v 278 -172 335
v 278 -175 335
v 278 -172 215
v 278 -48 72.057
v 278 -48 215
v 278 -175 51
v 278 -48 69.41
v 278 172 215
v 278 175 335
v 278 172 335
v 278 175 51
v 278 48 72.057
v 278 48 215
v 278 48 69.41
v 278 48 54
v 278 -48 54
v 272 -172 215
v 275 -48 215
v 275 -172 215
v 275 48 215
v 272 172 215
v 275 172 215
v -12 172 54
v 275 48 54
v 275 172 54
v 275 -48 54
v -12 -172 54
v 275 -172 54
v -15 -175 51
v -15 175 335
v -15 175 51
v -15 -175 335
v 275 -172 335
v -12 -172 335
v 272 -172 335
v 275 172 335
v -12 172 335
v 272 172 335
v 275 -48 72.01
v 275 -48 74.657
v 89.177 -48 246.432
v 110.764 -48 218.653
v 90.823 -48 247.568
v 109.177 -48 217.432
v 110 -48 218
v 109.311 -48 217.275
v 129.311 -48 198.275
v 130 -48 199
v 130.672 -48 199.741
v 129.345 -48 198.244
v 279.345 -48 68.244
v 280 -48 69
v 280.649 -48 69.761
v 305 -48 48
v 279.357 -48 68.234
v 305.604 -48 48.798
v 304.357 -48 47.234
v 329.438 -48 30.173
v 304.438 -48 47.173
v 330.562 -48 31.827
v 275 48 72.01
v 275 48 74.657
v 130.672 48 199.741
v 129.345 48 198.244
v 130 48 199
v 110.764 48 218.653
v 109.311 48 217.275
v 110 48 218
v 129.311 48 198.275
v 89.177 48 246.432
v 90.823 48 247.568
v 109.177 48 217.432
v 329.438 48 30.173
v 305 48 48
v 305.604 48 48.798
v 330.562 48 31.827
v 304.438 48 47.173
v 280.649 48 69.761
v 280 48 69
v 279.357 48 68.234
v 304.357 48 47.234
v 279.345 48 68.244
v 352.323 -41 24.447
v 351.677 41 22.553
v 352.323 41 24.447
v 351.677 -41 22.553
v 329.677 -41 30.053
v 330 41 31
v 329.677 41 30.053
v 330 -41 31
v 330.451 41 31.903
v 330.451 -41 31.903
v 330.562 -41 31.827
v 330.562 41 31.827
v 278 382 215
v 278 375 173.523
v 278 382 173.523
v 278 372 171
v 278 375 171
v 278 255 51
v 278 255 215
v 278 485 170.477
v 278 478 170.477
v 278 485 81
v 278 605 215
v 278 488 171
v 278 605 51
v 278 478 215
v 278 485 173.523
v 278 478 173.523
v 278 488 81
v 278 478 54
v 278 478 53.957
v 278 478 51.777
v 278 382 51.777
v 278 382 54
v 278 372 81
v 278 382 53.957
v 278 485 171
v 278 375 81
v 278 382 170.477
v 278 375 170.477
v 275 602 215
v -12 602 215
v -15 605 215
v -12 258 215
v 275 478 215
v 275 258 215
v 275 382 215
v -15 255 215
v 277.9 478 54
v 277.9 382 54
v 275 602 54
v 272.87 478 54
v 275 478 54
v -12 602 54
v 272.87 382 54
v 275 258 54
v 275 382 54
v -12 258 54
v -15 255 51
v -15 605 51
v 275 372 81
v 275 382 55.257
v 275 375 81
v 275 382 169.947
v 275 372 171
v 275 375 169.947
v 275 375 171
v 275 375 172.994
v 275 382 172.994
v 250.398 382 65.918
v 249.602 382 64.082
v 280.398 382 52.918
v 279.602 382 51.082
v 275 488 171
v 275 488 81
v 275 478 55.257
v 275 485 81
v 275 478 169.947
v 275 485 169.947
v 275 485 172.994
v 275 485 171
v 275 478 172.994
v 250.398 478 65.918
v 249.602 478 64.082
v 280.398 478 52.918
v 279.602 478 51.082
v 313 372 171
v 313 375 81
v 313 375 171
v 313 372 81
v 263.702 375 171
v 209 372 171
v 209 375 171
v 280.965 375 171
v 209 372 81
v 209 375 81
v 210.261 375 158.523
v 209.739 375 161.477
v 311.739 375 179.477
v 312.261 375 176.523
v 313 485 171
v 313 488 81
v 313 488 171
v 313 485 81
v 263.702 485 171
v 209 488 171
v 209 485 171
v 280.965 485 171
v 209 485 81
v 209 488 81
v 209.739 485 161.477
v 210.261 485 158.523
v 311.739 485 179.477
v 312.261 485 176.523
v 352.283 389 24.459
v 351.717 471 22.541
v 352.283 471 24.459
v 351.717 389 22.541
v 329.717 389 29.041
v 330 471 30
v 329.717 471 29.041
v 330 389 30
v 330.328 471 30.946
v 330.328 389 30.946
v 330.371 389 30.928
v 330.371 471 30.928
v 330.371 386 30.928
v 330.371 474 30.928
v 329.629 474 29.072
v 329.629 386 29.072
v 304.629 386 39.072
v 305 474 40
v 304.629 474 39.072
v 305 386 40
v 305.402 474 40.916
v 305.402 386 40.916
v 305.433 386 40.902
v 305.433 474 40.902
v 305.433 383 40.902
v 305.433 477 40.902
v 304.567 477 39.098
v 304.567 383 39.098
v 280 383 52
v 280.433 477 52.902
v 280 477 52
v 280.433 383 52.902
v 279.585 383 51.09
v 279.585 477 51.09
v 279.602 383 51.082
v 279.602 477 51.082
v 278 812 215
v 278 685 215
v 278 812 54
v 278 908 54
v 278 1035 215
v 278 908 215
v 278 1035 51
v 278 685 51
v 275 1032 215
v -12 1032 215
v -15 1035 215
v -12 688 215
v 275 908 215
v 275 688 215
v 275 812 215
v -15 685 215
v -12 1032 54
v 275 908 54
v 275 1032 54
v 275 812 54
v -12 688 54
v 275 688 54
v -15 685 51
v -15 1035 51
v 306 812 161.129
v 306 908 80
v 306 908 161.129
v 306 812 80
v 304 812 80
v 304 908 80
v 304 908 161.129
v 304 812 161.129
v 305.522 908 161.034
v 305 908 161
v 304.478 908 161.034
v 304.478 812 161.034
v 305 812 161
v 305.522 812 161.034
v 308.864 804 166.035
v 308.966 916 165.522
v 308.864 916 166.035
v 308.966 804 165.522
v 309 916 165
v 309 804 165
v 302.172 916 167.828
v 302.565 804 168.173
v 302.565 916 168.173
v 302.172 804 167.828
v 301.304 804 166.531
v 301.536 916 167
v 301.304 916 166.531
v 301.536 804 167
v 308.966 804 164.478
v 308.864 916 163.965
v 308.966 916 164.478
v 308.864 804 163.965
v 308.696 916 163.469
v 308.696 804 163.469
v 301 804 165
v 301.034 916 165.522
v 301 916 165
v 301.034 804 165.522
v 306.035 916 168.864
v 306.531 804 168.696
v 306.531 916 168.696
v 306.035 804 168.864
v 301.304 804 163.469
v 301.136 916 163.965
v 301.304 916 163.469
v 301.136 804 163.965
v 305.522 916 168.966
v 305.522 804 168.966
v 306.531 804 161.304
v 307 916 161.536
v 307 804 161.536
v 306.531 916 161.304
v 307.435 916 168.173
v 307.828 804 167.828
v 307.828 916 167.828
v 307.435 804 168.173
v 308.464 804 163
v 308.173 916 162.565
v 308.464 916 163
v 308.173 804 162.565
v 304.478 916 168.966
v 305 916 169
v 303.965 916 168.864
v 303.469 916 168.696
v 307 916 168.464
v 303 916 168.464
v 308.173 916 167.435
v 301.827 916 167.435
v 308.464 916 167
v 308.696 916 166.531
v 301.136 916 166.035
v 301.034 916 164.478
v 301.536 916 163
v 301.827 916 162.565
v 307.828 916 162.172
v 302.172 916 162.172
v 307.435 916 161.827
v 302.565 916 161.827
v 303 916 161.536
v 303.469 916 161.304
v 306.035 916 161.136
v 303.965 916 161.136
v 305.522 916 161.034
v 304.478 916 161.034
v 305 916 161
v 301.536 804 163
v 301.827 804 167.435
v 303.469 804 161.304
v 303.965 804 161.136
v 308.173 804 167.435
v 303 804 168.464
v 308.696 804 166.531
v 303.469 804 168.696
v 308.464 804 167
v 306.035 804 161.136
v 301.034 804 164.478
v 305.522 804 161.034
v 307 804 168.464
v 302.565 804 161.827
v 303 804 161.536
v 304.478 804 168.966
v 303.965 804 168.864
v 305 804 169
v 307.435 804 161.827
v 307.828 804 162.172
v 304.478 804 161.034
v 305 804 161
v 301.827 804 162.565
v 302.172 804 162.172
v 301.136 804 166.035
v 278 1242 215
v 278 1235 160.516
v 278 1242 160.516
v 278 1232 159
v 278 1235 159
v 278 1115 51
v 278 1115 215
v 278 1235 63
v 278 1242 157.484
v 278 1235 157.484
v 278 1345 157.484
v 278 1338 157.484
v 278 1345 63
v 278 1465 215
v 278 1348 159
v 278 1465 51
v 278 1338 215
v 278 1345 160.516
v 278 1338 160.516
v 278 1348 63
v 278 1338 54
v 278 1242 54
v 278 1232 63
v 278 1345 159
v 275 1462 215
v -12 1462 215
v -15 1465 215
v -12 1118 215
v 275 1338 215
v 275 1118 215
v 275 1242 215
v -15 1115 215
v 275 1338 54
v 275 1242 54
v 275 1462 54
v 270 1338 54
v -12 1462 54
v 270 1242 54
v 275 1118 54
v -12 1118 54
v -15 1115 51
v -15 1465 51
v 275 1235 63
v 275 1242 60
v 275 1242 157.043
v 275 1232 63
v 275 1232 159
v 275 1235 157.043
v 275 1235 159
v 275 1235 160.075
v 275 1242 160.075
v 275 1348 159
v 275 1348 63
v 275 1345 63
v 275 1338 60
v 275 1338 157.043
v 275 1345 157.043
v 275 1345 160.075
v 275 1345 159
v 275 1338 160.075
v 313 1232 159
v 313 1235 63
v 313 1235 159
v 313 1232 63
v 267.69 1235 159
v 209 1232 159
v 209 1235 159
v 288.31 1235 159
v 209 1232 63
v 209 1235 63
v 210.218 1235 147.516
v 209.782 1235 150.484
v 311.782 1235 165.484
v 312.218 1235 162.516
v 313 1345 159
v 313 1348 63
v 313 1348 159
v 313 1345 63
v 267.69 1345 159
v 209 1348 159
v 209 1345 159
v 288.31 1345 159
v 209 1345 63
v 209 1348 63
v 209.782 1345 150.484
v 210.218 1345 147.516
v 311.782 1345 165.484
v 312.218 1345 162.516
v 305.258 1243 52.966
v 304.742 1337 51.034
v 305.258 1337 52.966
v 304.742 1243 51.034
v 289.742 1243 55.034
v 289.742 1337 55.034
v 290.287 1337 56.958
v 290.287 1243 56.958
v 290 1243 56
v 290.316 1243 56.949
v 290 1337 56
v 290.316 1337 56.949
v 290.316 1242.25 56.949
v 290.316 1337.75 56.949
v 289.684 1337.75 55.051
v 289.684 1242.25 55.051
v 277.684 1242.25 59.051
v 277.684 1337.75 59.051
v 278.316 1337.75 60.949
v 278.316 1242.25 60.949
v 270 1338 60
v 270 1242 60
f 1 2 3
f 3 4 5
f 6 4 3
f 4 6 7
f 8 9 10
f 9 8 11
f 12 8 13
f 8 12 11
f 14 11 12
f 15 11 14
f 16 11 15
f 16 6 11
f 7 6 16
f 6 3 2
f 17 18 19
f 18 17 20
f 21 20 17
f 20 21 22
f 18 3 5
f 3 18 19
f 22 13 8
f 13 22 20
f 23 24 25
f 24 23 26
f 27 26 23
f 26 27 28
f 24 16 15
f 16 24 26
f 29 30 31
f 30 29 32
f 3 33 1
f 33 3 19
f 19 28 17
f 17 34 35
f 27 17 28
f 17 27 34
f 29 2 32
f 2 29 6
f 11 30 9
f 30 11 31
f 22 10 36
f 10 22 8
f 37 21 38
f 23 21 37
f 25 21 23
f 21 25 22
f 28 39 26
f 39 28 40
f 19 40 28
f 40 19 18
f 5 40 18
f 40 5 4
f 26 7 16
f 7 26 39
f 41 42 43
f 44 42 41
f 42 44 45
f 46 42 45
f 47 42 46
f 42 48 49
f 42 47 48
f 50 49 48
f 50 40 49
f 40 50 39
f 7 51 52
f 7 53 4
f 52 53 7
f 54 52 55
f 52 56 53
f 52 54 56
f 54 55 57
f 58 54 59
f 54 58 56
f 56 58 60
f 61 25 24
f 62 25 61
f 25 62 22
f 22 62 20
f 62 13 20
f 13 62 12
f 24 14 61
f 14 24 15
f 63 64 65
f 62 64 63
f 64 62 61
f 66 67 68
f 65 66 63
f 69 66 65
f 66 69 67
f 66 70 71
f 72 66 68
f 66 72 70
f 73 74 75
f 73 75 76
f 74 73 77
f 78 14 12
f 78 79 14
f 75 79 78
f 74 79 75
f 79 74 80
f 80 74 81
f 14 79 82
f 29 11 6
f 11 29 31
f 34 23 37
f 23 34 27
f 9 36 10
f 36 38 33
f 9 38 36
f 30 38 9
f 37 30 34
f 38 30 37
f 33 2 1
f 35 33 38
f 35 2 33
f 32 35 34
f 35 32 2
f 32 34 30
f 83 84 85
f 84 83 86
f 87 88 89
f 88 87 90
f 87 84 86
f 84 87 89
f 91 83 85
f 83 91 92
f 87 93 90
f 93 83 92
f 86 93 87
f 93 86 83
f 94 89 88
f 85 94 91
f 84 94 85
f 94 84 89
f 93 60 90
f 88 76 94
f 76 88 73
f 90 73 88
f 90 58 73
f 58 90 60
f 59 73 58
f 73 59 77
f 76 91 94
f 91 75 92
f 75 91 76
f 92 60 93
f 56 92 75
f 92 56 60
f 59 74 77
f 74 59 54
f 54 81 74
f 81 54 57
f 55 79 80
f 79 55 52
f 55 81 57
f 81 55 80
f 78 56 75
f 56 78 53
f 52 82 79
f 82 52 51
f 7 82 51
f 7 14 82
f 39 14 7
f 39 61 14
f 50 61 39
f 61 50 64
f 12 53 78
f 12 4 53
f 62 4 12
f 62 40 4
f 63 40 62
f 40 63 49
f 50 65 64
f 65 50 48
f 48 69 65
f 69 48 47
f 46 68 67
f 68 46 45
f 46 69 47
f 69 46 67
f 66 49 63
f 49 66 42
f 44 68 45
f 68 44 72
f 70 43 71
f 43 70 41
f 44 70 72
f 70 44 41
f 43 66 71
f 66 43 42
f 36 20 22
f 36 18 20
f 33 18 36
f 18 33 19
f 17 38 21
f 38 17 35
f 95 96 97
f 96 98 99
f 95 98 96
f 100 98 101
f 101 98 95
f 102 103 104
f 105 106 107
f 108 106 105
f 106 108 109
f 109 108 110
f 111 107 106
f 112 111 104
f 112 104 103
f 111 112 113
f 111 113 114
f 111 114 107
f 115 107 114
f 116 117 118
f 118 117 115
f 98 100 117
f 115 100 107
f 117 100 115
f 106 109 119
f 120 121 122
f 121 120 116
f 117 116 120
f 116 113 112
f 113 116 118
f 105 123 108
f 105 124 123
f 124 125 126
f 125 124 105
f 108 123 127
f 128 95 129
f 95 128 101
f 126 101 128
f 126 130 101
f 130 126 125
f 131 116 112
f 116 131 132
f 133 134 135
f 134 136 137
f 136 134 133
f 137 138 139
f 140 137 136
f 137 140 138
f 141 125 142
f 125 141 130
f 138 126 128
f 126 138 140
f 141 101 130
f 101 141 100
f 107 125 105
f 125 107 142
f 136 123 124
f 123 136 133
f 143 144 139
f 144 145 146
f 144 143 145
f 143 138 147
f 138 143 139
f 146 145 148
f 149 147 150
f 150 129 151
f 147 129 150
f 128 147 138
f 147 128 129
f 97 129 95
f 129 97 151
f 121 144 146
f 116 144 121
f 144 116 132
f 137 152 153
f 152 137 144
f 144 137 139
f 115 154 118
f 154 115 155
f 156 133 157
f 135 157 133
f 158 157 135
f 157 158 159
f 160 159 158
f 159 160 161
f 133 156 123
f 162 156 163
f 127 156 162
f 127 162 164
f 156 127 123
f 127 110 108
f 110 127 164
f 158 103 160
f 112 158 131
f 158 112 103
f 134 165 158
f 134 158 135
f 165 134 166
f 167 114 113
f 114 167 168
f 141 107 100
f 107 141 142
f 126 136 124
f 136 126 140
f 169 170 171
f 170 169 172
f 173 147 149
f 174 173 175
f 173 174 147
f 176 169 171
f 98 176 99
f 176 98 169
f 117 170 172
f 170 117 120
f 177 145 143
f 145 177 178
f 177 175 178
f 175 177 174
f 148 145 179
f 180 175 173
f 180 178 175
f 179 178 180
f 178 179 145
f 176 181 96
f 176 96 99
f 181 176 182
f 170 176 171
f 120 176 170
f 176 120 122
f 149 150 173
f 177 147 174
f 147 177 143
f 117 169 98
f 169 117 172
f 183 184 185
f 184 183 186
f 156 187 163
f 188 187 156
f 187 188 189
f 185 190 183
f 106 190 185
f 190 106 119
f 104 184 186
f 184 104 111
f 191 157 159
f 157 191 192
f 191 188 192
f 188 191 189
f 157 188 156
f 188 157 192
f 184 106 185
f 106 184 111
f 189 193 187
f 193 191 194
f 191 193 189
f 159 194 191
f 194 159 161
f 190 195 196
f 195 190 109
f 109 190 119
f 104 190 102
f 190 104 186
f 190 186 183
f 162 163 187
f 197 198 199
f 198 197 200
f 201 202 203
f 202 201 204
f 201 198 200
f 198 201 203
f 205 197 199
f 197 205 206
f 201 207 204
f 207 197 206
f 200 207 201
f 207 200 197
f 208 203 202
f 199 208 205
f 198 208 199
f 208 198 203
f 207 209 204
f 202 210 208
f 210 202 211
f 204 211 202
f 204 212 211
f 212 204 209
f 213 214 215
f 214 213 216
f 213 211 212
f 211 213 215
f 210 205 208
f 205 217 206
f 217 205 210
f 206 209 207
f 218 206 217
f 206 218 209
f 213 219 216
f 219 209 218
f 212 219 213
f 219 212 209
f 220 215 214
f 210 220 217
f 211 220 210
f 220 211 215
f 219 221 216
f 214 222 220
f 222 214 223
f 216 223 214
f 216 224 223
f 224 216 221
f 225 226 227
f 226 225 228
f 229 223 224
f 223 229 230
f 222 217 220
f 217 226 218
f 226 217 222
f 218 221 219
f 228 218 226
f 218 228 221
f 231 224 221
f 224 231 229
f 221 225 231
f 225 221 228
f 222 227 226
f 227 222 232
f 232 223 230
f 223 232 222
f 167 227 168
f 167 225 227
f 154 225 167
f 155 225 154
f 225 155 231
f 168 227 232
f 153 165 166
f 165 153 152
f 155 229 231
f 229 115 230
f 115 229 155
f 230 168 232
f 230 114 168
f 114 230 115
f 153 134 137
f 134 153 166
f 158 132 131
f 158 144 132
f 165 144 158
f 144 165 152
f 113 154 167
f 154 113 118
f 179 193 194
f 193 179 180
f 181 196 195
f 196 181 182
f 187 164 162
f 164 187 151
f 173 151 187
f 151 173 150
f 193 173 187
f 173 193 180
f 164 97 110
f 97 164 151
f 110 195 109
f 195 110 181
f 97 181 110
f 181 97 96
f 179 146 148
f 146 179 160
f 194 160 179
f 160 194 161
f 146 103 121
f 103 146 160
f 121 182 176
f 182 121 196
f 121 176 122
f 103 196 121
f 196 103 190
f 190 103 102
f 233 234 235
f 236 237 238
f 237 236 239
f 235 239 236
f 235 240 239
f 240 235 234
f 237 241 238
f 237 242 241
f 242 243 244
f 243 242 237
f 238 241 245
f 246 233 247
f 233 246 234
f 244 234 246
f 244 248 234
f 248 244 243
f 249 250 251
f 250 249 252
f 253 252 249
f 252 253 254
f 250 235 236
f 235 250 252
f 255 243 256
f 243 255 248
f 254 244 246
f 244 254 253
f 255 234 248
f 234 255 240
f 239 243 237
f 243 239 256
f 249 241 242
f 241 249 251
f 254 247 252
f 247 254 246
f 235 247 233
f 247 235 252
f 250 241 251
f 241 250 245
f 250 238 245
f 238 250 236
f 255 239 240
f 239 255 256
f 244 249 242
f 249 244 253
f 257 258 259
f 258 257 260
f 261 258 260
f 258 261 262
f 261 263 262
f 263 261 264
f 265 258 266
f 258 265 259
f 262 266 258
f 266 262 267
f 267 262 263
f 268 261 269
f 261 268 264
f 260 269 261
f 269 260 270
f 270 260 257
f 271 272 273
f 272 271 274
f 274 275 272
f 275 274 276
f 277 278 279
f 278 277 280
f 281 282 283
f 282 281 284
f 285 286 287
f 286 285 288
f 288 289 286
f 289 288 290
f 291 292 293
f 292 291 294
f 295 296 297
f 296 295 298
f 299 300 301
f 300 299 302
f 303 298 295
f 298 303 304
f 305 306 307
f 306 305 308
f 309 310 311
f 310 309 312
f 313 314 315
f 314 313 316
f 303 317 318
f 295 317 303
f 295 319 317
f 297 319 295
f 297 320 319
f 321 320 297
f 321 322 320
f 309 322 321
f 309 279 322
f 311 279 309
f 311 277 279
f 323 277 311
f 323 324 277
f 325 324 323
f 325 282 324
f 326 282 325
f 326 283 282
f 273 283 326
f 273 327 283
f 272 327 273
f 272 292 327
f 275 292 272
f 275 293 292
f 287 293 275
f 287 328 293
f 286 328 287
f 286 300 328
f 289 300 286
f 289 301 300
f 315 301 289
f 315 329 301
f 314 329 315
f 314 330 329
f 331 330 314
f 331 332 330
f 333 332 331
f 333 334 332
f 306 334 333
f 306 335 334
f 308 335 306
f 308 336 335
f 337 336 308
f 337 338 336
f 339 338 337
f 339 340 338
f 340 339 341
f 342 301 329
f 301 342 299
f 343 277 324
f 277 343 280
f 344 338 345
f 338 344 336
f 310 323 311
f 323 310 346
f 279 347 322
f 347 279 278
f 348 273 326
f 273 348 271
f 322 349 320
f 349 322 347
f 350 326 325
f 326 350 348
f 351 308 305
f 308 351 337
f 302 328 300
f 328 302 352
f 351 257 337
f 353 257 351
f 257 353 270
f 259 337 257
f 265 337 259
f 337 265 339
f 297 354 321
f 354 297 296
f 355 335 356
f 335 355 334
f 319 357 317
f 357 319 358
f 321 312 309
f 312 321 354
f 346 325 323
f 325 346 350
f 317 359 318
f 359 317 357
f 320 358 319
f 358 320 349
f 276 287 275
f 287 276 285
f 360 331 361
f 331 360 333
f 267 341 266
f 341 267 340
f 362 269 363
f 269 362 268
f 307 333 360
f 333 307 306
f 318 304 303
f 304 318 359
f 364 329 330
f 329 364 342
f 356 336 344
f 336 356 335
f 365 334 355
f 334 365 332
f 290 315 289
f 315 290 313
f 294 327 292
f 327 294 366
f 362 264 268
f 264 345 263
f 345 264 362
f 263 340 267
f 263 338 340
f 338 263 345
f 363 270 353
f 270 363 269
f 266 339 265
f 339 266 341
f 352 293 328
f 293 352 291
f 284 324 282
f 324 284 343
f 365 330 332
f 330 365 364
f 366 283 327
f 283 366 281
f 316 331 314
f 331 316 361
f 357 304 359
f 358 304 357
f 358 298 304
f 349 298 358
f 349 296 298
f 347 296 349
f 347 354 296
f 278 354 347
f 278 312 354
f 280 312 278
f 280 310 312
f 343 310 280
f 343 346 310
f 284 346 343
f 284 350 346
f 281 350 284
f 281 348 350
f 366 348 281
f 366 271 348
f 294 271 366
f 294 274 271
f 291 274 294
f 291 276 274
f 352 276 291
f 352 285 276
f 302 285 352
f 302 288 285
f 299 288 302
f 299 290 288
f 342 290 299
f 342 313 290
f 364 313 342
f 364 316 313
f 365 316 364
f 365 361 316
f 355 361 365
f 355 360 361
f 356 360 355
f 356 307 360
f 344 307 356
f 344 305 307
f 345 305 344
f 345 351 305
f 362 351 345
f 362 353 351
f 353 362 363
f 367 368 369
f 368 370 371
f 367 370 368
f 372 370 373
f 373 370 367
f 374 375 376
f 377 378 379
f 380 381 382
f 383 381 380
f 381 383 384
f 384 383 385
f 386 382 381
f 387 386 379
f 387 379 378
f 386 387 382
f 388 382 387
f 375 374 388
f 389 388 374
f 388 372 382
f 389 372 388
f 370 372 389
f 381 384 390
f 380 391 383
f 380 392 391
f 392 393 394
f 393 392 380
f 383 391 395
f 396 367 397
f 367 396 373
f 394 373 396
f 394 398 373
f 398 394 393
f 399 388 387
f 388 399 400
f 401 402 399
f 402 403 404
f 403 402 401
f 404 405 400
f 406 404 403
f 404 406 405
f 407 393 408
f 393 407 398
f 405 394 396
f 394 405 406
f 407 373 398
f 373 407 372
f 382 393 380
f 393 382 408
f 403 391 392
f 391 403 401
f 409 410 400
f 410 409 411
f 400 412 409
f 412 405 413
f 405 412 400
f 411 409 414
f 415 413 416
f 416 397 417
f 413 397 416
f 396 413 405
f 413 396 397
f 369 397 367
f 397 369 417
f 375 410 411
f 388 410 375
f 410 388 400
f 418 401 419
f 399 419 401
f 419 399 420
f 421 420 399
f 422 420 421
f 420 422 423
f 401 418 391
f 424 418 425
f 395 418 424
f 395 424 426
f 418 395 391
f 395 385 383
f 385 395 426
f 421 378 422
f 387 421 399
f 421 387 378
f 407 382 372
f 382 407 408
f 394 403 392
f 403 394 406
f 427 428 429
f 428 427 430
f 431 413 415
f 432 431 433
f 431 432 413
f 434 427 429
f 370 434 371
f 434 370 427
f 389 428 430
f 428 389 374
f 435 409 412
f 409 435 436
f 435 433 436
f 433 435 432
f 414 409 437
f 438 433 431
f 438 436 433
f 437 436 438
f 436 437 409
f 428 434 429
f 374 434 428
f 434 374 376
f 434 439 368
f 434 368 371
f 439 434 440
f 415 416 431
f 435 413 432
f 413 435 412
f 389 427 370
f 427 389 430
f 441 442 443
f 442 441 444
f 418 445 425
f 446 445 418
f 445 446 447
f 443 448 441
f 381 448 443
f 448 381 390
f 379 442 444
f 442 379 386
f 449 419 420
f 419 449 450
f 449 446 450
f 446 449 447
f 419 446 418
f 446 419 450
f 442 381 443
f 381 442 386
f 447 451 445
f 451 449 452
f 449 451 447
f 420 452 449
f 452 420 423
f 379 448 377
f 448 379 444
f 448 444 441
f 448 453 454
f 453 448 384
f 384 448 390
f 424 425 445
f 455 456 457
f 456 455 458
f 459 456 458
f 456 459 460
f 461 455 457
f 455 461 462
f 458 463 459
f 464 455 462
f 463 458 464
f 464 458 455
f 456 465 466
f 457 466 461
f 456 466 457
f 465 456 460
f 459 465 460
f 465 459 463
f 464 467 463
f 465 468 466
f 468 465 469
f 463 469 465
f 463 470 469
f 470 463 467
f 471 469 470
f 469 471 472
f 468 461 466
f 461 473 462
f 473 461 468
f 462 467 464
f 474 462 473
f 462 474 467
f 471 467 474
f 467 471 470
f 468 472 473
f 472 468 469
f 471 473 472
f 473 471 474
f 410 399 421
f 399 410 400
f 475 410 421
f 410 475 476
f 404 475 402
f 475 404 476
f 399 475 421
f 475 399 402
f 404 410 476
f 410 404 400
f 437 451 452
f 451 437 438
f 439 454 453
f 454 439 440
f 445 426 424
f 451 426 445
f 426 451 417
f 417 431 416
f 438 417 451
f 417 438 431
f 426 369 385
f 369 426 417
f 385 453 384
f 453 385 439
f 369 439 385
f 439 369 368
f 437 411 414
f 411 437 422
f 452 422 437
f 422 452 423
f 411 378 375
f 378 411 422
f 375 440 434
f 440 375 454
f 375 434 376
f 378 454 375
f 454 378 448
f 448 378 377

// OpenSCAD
// P2-47 dependent basket-entry comparison.  Concept/reference geometry only;
// no STL release.  Coordinates are millimetres in the v3 base frame.
variant = "all"; // [all,tall_open_drop,high_hood,one_way_flap,lip_cover]
$fn = 48;

floor_z = 54;
basket_front_x = 278;
basket_rear_x = -15;
basket_half_y = 175;
basket_top_z = 215;
entry_half_y = 48;

module basket_shell() {
  color([.65,.65,.68,.25]) {
    translate([(basket_front_x+basket_rear_x)/2,0,floor_z-1.5]) cube([basket_front_x-basket_rear_x,350,3],center=true);
    for(y=[-173.5,173.5]) translate([131.5,y,(floor_z+basket_top_z)/2]) cube([293,3,basket_top_z-floor_z],center=true);
    translate([basket_rear_x+1.5,0,(floor_z+basket_top_z)/2]) cube([3,350,basket_top_z-floor_z],center=true);
    for(y=[-111.5,111.5]) translate([basket_front_x-1.5,y,(floor_z+basket_top_z)/2]) cube([3,127,basket_top_z-floor_z],center=true);
  }
}

module panel_between(x0,z0,x1,z1,width=110,t=3,c=[.2,.55,.9,1]) {
  dx=x1-x0; dz=z1-z0; len=sqrt(dx*dx+dz*dz); a=atan2(dz,dx);
  color(c) translate([(x0+x1)/2,0,(z0+z1)/2]) rotate([0,-a,0]) cube([len,width,t],center=true);
}

module high_hood() {
  // Controlled-rise entry then 40+ mm rear-overhung hood.
  panel_between(352,23.5,330,30,82,2);
  panel_between(330,30,305,40,88,2);
  panel_between(305,40,280,52,94,2);
  panel_between(280,52,250,65,96,2);
  panel_between(210,160,312,178,110,3,[1,.55,.1,1]);
  for(y=[-56.5,56.5]) color([1,.55,.1,1]) translate([261,y,126]) cube([104,3,90],center=true);
}

module one_way_flap(angle=0) {
  // Physical concept: top hinge, positive rotation only into -X; positive
  // latch/stop required at 0 degrees.  Shown closed.
  color([.95,.35,.08,1]) translate([305,0,165]) rotate([0,angle,0]) translate([0,0,-42.5]) cube([2,96,85],center=true);
  color([.25,.25,.28,1]) translate([305,0,165]) rotate([90,0,0]) cylinder(d=8,h=112,center=true);
}

module lip_cover() {
  panel_between(305,52,290,56,94,2);
  panel_between(290,56,278,60,95.5,2);
  color([.95,.35,.08,1]) translate([272.5,0,57]) cube([5,96,6],center=true);
  panel_between(210,149,312,164,110,3,[1,.75,.15,1]);
  for(y=[-56.5,56.5]) color([1,.75,.15,1]) translate([261,y,111]) cube([104,3,96],center=true);
}

module tall_open_drop() {
  // P2-47 simplest candidate: 335 mm rim, uncovered bridge and rear drop.
  // No flap, hood or liner; the lower feed/singulator interface remains open.
  for(y=[-173.5,173.5]) color([.35,.72,.42,.55])
    translate([131.5,y,275]) cube([293,3,120],center=true);
  color([.35,.72,.42,.55]) translate([-13.5,0,275]) cube([3,350,120],center=true);
  color([.35,.72,.42,.55]) translate([273.5,0,275]) cube([3,350,120],center=true);
  pts=[[352,23.5],[330,31],[305,48],[280,69],[250,95],[220,121],[190,147],[160,173],[130,199],[110,218],[90,247]];
  for(i=[0:len(pts)-2]) panel_between(pts[i][0],pts[i][1],pts[i+1][0],pts[i+1][1],i==0?82:96,2,[.10,.62,.92,1]);
}

if (variant=="all") {
  for(i=[0:3]) translate([0,i*430,0]) { basket_shell(); if(i==0) tall_open_drop(); if(i==1) high_hood(); if(i==2) one_way_flap(); if(i==3) lip_cover(); }
} else {
  basket_shell();
  if(variant=="tall_open_drop") tall_open_drop();
  if(variant=="high_hood") high_hood();
  if(variant=="one_way_flap") one_way_flap();
  if(variant=="lip_cover") lip_cover();
}
